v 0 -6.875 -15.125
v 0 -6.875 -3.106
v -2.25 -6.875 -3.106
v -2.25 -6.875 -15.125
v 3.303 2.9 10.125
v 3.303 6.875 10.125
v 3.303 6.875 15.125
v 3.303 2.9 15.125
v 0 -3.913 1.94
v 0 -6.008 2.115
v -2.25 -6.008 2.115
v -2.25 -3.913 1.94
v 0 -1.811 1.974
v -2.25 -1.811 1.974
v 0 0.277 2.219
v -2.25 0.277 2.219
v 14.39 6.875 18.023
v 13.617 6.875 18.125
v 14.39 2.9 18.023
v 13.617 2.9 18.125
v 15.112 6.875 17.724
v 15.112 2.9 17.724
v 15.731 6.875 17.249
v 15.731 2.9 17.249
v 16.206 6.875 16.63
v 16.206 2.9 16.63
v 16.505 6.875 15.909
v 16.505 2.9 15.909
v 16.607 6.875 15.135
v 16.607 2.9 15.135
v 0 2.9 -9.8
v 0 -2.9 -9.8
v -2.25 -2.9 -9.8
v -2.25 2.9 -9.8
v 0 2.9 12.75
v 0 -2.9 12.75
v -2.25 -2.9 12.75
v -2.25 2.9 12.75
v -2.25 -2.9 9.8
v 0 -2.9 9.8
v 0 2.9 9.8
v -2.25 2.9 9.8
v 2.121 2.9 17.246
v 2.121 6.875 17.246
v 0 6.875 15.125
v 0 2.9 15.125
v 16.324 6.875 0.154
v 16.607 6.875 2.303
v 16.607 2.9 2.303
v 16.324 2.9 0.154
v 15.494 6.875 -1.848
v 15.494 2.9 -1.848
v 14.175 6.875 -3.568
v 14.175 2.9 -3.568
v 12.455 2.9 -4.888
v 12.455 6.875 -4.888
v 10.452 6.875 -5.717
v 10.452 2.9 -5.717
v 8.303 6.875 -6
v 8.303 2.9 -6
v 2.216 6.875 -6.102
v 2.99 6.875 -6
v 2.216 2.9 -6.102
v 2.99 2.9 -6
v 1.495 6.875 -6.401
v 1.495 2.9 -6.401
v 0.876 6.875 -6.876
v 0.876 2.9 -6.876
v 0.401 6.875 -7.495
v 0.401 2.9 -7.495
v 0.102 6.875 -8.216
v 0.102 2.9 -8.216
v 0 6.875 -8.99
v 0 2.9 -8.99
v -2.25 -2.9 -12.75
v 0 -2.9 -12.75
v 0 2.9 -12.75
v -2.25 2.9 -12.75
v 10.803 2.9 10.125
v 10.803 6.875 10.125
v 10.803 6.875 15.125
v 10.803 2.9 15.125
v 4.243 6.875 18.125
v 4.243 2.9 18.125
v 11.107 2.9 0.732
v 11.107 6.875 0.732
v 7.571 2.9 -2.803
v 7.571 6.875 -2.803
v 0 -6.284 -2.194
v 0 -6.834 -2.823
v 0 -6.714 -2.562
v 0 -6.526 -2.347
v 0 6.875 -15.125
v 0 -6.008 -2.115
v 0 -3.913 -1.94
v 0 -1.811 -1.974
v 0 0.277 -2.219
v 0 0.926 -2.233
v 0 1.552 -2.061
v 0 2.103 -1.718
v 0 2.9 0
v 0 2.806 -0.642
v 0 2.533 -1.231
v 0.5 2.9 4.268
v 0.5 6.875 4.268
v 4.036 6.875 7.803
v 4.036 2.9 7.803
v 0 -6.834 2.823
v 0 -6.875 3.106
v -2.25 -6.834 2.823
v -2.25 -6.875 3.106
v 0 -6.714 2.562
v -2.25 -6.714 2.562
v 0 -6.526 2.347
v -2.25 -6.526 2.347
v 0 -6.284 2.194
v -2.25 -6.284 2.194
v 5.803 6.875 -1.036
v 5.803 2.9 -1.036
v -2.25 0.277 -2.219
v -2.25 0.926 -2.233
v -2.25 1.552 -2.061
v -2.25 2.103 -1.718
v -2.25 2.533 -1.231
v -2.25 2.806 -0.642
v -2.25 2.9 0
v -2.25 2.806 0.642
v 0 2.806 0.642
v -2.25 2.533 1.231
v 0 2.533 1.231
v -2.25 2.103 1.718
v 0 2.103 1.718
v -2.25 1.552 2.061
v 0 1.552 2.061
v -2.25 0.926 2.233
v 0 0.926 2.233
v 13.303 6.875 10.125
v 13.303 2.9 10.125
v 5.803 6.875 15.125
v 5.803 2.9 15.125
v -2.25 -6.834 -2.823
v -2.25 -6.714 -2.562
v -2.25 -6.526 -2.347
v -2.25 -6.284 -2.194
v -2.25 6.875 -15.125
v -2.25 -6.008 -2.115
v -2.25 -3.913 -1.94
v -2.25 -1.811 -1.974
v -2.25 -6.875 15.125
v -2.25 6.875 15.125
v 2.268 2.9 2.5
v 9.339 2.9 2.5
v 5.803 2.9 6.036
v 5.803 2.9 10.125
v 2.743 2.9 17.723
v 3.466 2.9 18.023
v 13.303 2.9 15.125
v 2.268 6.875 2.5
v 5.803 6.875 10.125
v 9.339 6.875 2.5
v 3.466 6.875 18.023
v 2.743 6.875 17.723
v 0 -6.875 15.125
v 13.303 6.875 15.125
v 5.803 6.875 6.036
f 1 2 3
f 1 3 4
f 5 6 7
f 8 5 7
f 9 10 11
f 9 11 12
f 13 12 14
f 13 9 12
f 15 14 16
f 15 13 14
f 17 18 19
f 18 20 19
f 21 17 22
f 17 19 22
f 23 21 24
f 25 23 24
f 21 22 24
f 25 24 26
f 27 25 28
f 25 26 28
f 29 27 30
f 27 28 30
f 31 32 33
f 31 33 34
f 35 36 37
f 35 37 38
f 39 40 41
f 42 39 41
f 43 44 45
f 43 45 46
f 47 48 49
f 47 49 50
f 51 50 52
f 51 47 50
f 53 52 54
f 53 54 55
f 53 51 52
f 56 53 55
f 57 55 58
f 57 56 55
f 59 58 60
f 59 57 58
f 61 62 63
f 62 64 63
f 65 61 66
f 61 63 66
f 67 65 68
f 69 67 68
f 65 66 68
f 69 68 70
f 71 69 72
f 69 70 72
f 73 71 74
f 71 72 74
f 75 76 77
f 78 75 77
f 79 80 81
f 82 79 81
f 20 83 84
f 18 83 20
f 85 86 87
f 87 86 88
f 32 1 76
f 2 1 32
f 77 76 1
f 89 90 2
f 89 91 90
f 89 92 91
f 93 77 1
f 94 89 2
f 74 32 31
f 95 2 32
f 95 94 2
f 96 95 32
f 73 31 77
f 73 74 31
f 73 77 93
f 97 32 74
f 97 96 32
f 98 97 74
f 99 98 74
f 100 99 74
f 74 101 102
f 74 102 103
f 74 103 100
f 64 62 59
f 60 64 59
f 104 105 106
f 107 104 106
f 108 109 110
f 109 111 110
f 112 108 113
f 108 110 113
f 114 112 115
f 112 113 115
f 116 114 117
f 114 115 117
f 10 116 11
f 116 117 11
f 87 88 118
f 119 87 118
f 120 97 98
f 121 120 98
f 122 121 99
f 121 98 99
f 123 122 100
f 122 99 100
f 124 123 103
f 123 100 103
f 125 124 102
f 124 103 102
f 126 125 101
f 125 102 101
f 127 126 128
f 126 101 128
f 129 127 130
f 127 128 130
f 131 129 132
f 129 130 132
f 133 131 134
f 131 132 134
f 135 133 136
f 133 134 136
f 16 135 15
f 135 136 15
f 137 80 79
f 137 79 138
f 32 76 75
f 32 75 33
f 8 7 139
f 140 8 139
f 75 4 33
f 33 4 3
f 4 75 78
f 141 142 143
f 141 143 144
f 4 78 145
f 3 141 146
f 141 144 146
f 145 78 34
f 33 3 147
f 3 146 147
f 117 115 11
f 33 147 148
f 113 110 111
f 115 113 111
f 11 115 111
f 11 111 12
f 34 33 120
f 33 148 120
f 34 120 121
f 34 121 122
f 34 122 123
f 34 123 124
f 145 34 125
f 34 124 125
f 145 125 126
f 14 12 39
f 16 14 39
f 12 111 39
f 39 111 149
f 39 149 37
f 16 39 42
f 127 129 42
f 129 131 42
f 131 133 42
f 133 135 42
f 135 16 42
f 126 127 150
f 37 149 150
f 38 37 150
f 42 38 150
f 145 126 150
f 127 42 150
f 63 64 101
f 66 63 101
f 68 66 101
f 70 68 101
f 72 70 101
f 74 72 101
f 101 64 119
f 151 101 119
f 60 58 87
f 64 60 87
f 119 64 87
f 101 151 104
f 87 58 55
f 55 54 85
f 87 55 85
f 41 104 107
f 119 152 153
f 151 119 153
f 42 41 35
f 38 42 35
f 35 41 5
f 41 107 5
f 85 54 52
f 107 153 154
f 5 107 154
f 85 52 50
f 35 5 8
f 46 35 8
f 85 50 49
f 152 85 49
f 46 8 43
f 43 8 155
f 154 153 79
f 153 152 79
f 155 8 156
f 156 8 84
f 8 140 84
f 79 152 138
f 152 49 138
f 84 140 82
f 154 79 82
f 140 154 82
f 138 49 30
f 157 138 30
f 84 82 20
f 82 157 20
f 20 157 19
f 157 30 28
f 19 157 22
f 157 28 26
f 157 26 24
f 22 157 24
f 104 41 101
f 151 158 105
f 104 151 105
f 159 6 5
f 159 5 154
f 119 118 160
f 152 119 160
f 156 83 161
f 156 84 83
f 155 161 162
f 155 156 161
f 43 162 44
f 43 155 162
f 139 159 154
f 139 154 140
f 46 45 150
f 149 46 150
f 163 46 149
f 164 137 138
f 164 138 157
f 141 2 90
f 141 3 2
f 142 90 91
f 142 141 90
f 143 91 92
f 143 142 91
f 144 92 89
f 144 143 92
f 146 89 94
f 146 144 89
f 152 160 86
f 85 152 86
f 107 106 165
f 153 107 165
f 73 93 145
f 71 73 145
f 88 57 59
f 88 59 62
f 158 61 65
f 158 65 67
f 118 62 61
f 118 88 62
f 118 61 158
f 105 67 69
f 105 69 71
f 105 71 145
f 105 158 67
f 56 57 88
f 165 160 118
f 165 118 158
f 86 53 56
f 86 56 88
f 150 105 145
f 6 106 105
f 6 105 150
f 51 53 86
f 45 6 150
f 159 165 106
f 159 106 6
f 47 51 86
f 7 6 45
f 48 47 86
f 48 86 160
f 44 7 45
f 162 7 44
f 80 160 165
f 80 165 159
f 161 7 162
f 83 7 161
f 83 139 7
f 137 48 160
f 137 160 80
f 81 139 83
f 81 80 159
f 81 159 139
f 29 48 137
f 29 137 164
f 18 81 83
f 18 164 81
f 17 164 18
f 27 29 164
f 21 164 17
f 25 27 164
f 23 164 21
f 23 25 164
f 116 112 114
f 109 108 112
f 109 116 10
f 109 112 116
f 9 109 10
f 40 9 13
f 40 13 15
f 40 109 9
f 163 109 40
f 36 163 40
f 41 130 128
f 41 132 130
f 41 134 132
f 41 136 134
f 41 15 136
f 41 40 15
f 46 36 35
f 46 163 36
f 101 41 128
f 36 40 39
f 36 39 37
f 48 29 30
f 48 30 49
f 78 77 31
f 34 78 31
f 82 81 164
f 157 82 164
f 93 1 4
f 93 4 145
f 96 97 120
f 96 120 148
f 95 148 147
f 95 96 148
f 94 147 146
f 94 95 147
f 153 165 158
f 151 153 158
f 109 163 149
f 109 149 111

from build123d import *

# Parameters (mm, degrees)
SKETCH_W     = 5.8
SKETCH_H     = 2.95
PAD_DEPTH    = 2.25
SKETCH001_W  = 5
SKETCH001_H  = 2.5
PAD001_DEPTH = 3.975
FILLET_R     = 2.99
CHAMFER_SIZE = 2.9999
FILLET001_R  = 3
FILLET002_R  = 1


with BuildPart() as part:
    # Sketch → Pad (new body)
    with BuildSketch(Plane.YZ):
        with BuildLine():
            Line((-6.875, -15.125), (6.875, -15.125))
            Line((6.875, -15.125), (6.875, 15.125))
            Line((6.875, 15.125), (-6.875, 15.125))
            Line((-6.875, 15.125), (-6.875, 2.25))
            ThreePointArc((-6.875, 2.25), (-3.300315, 1.928152), (0.277037, 2.218873))
            ThreePointArc((0.277037, -2.218873), (2.9, 0), (0.277037, 2.218873))
            ThreePointArc((0.277037, -2.218873), (-3.300315, -1.928152), (-6.875, -2.25))
            Line((-6.875, -2.25), (-6.875, -15.125))
        make_face()
        with Locations((0, 11.275)):
            Rectangle(SKETCH_W, SKETCH_H, mode=Mode.SUBTRACT)
        with Locations((0, -11.275)):
            Rectangle(SKETCH_W, SKETCH_H, mode=Mode.SUBTRACT)
    extrude(amount=-PAD_DEPTH)

    # Sketch001 (on DatumPlane) → Pad001 (join)
    with BuildSketch(Plane.ZX.offset(6.875)):
        with BuildLine():
            Line((-6, 0), (15.125, 0))
            Line((15.125, 0), (18.125, 0))
            Line((18.125, 0), (18.125, 16.606602))
            Line((18.125, 16.606602), (15.125, 16.606602))
            Line((2.303301, 16.606602), (15.125, 16.606602))
            ThreePointArc((2.303301, 16.606602), (-3.568019, 14.174621), (-6, 8.303301))
            Line((-6, 0), (-6, 8.303301))
        make_face()
        with Locations((12.625, 4.553301)):
            Rectangle(SKETCH001_W, SKETCH001_H, mode=Mode.SUBTRACT)
        with Locations((12.625, 12.053301)):
            Rectangle(SKETCH001_W, SKETCH001_H, mode=Mode.SUBTRACT)
        Polygon((4.267767, 0.5), (7.803301, 4.035534), (6.035534, 5.803301), (2.5, 2.267767), align=None, mode=Mode.SUBTRACT)
        Polygon((-1.035534, 5.803301), (2.5, 9.338835), (0.732233, 11.106602), (-2.803301, 7.571068), align=None, mode=Mode.SUBTRACT)
    extrude(amount=-PAD001_DEPTH)

    # Fillet
    fillet_edges = [part.edges().sort_by_distance(p)[0] for p in [
        (0, 4.8875, -6),
        (16.606602, 4.8875, 18.125),
    ]]
    fillet(fillet_edges, radius=FILLET_R)

    # Chamfer
    chamfer_edges = [part.edges().sort_by_distance(p)[0] for p in [
        (0, 4.8875, 18.125),
    ]]
    chamfer(chamfer_edges, length=CHAMFER_SIZE)

    # Fillet001
    fillet001_edges = [part.edges().sort_by_distance(p)[0] for p in [
        (2.9999, 4.8875, 18.125),
    ]]
    fillet(fillet001_edges, radius=FILLET001_R)

    # Fillet002
    fillet002_edges = [part.edges().sort_by_distance(p)[0] for p in [
        (-1.125, -6.875, 2.25),
        (-1.125, -6.875, -2.25),
    ]]
    fillet(fillet002_edges, radius=FILLET002_R)


solid = part.part
